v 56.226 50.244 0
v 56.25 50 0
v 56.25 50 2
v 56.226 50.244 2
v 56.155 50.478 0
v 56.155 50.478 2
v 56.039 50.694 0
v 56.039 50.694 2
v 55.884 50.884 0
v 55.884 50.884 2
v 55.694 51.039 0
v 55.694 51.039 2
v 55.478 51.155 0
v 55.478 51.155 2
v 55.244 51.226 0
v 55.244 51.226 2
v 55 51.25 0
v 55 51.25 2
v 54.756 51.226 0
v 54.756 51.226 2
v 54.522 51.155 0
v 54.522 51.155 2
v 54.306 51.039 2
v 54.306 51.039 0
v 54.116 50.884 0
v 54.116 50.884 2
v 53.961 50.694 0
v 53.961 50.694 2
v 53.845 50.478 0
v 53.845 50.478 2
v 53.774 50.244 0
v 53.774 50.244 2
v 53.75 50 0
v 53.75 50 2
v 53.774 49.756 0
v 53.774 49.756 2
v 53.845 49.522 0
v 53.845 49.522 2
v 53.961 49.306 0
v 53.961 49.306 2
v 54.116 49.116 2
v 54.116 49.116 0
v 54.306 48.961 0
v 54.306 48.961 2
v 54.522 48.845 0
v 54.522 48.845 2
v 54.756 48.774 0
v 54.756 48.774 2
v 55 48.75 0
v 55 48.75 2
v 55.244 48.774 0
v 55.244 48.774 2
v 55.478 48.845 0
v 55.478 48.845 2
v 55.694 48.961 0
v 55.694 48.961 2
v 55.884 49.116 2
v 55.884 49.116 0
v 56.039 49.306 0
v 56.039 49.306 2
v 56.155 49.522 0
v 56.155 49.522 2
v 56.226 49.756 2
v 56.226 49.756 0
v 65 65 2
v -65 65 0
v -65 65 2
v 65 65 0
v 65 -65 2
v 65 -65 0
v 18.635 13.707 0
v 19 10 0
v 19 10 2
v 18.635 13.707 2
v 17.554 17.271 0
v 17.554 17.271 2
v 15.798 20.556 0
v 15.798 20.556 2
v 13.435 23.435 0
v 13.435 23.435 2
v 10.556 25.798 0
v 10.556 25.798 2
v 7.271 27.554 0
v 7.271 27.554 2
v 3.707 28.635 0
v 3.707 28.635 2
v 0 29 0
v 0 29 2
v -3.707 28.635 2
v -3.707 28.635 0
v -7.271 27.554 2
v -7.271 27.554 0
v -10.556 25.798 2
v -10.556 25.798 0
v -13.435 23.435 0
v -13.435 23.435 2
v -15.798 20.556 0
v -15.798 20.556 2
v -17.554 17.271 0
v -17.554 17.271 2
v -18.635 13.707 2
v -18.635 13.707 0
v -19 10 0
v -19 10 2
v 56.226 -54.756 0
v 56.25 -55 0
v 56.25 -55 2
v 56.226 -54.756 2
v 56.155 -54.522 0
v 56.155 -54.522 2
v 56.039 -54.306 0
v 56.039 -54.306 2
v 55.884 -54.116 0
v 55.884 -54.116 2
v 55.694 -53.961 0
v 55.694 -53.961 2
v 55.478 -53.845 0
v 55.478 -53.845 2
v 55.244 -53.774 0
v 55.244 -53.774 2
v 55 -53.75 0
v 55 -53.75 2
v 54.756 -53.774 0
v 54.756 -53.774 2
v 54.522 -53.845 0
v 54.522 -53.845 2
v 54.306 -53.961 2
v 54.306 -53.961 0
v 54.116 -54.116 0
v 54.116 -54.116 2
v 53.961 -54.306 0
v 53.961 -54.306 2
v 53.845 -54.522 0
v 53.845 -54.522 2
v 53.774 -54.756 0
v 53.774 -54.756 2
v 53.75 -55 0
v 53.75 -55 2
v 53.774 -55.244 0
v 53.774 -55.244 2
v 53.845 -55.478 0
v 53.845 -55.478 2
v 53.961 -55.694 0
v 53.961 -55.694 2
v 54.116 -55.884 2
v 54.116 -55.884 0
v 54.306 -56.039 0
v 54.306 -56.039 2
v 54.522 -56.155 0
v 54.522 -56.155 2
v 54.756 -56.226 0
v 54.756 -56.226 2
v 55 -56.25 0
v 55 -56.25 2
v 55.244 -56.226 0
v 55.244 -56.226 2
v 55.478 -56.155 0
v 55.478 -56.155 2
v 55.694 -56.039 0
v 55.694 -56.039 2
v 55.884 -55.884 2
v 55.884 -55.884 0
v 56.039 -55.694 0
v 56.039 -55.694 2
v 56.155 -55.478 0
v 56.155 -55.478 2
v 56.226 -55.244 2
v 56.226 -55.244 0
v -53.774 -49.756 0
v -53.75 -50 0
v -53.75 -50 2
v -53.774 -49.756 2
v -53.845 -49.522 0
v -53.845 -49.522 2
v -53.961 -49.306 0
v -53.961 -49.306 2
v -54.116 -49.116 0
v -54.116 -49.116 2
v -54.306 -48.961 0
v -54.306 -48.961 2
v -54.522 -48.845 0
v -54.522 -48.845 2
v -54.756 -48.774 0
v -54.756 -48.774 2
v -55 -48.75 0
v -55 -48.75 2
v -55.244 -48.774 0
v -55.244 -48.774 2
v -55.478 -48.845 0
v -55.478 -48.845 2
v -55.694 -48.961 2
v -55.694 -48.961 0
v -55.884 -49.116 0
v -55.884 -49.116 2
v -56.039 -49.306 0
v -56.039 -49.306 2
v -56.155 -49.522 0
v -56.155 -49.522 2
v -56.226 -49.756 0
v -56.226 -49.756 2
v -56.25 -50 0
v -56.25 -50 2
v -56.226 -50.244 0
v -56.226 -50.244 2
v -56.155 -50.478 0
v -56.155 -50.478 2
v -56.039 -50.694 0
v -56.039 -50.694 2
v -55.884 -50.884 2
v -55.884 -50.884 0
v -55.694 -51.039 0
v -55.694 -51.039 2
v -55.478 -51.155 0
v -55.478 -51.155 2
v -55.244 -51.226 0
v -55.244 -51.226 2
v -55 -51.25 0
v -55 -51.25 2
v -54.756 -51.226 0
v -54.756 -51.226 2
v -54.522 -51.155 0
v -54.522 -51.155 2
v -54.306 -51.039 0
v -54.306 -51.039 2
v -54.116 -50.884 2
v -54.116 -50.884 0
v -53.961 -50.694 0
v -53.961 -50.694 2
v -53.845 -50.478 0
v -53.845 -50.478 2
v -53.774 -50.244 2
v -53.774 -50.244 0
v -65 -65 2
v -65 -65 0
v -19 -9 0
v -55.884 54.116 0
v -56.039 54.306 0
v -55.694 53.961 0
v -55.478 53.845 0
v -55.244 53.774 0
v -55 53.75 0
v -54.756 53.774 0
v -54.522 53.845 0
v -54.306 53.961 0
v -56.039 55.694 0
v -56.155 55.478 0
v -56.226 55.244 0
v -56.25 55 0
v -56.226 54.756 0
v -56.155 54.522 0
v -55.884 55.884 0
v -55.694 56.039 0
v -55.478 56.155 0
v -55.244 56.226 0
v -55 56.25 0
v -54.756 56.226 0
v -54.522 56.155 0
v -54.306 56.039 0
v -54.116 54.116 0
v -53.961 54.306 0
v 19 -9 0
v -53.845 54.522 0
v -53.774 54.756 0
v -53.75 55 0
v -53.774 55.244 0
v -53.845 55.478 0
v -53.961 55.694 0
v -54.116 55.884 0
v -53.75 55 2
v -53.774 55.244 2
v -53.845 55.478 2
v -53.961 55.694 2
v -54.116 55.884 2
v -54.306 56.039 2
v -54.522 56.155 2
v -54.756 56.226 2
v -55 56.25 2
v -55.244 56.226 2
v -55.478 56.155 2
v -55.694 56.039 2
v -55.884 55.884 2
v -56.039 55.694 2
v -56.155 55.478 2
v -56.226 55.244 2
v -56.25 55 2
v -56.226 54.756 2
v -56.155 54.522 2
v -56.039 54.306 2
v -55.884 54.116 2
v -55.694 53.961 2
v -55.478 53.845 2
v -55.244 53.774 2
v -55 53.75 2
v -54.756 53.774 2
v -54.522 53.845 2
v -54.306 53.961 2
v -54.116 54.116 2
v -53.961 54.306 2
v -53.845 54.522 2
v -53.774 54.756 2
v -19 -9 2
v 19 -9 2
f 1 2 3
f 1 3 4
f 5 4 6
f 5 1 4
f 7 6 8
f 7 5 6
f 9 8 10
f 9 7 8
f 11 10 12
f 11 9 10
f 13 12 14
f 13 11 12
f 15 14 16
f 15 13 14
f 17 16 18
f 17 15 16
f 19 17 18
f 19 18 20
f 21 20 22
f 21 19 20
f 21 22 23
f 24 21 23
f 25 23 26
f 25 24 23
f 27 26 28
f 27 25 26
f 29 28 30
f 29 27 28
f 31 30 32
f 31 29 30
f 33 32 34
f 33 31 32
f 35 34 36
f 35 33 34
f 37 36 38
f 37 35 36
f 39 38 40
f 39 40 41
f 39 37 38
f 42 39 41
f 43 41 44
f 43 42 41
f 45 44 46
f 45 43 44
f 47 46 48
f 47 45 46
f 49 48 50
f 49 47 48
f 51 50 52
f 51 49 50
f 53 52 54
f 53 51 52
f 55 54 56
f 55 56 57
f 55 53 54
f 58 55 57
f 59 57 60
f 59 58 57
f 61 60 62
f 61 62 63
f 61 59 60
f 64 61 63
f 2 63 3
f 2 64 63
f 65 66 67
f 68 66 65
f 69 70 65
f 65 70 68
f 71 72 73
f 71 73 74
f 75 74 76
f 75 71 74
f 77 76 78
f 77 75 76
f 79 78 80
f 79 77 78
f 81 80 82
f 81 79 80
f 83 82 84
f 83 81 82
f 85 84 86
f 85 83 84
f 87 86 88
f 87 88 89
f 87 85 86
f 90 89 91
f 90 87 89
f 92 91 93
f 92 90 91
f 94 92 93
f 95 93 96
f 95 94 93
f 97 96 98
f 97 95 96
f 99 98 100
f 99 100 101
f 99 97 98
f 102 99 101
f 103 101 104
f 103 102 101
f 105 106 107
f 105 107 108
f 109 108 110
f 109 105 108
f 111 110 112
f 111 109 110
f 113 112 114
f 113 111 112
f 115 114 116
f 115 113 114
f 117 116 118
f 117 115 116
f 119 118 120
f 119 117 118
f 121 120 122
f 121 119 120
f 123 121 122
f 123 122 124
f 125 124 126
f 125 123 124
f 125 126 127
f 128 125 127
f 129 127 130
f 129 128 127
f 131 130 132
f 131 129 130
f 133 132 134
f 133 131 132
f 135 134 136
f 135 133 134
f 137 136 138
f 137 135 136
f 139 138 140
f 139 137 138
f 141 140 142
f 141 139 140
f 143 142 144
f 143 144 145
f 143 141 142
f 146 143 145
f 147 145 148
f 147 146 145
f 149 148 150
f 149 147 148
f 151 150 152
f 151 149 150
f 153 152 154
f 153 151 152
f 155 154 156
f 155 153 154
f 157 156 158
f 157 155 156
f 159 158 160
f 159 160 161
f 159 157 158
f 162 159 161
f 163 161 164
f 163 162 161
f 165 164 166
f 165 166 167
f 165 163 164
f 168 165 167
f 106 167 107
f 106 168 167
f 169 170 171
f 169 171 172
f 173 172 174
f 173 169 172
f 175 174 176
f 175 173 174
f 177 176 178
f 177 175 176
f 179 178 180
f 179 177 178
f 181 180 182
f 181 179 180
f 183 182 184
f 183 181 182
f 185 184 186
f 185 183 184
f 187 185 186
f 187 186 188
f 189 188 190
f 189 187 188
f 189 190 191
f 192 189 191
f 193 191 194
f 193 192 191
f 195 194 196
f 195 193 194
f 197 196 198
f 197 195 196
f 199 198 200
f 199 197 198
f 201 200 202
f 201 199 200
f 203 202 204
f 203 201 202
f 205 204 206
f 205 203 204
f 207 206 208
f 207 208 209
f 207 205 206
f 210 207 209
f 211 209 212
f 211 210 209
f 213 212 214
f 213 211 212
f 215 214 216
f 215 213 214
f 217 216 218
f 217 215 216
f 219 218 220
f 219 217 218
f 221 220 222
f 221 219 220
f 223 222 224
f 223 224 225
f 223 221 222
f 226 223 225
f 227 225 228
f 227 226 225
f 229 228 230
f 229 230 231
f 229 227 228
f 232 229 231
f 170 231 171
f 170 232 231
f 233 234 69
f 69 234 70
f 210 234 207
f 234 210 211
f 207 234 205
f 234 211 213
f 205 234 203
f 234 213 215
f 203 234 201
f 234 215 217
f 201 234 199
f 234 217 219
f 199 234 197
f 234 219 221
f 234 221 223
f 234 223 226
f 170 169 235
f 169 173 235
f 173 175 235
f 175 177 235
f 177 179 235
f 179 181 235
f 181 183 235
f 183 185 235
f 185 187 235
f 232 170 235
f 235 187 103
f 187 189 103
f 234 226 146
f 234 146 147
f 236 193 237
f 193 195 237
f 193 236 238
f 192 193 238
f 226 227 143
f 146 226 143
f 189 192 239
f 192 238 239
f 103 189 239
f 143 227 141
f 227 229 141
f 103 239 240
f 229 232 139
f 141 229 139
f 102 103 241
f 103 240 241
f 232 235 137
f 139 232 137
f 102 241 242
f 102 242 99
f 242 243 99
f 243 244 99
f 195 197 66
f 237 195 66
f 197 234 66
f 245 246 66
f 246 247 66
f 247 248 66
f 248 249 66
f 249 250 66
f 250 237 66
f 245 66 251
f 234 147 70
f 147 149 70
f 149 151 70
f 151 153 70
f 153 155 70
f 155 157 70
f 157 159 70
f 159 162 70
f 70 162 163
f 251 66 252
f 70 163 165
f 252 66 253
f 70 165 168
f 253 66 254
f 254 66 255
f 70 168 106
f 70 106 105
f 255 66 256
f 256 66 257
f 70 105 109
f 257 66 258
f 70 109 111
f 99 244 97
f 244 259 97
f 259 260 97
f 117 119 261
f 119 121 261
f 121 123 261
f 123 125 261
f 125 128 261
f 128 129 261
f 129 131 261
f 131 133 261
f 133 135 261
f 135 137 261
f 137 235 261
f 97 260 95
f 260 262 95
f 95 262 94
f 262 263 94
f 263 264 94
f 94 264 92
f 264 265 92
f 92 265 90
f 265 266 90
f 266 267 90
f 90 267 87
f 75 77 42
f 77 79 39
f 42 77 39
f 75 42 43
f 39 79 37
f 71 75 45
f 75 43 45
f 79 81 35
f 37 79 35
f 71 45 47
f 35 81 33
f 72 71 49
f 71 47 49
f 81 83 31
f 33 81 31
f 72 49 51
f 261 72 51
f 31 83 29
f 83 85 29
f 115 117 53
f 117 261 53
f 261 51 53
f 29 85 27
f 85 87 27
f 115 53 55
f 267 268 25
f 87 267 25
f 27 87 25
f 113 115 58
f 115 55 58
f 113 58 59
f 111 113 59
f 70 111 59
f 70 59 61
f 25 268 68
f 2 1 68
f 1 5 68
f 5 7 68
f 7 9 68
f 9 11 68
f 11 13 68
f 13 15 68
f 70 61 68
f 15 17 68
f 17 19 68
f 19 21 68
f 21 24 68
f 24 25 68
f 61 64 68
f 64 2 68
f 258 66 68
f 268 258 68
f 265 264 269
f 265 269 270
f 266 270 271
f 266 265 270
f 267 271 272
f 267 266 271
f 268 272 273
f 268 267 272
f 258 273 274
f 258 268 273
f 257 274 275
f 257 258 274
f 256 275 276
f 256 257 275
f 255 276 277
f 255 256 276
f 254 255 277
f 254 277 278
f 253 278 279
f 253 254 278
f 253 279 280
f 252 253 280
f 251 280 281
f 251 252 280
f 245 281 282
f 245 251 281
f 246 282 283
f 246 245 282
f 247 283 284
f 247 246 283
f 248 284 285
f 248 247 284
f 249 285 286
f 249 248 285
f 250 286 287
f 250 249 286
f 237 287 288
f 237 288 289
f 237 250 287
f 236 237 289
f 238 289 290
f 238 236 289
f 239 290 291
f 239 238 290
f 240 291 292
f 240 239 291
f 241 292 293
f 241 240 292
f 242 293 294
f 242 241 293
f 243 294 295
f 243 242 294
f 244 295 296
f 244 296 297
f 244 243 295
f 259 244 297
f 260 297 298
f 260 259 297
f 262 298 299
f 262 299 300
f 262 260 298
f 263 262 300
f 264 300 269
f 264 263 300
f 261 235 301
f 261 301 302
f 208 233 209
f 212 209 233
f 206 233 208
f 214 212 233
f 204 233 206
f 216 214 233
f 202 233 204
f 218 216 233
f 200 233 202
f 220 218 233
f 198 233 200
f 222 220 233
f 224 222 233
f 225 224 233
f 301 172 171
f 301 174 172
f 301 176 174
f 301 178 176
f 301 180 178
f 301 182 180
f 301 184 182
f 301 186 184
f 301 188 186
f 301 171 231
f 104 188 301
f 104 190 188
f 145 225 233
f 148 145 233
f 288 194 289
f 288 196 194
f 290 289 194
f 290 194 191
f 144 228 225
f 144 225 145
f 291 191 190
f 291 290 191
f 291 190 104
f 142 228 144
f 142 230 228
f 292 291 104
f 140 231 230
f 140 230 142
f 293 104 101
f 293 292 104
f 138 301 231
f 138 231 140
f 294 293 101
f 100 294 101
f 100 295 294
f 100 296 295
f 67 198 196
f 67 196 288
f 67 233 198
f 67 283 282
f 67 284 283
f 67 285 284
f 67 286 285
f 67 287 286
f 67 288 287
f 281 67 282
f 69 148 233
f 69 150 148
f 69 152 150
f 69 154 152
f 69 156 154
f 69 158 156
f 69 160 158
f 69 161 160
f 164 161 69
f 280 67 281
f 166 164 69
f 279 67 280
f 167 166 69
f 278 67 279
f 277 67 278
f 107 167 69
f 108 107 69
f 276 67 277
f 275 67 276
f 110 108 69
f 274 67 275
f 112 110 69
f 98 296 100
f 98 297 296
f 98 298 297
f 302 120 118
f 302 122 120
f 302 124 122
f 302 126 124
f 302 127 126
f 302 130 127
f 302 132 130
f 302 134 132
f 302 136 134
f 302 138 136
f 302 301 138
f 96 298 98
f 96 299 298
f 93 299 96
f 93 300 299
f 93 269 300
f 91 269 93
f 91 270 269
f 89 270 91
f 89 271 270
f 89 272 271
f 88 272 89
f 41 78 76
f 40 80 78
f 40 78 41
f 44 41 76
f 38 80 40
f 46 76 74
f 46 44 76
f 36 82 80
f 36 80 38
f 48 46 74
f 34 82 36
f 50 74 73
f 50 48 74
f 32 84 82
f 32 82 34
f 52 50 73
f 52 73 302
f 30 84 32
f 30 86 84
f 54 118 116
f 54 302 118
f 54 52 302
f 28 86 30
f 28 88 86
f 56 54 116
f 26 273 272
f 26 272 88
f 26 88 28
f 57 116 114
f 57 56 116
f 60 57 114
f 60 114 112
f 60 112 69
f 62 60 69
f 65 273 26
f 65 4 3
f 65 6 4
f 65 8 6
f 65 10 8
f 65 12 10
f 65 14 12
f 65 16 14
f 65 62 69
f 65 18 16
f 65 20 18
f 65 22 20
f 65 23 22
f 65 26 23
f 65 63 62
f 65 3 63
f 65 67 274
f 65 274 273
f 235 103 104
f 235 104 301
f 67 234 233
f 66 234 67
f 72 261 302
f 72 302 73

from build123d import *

# Parameters (mm, degrees)
SKETCH_1_W      = 130
SKETCH_1_H      = 130
SKETCH_1_R      = 1.25
EXTRUDE_1_DEPTH = 2


with BuildPart() as part:
    # Эскиз1 → Бобышка-Вытянуть1 (new body)
    with BuildSketch(Plane.XY):
        Rectangle(SKETCH_1_W, SKETCH_1_H)
        with Locations((-55, 55)):
            Circle(SKETCH_1_R, mode=Mode.SUBTRACT)
        with Locations((55, 50)):
            Circle(SKETCH_1_R, mode=Mode.SUBTRACT)
        with Locations((55, -55)):
            Circle(SKETCH_1_R, mode=Mode.SUBTRACT)
        with Locations((-55, -50)):
            Circle(SKETCH_1_R, mode=Mode.SUBTRACT)
        with BuildLine():
            Line((-18.999998719, 10.000001538), (-18.999998719, -9.000007164))
            Line((-18.999998719, -9.000007164), (19.000000929, -9.000007164))
            Line((19.000000929, -9.000007164), (19.000000929, 10.000001538))
            ThreePointArc((19.000000929, 10.000001538), (1.105e-06, 29.000001361), (-18.999998719, 10.000001538))
        make_face(mode=Mode.SUBTRACT)
    extrude(amount=EXTRUDE_1_DEPTH)


solid = part.part
